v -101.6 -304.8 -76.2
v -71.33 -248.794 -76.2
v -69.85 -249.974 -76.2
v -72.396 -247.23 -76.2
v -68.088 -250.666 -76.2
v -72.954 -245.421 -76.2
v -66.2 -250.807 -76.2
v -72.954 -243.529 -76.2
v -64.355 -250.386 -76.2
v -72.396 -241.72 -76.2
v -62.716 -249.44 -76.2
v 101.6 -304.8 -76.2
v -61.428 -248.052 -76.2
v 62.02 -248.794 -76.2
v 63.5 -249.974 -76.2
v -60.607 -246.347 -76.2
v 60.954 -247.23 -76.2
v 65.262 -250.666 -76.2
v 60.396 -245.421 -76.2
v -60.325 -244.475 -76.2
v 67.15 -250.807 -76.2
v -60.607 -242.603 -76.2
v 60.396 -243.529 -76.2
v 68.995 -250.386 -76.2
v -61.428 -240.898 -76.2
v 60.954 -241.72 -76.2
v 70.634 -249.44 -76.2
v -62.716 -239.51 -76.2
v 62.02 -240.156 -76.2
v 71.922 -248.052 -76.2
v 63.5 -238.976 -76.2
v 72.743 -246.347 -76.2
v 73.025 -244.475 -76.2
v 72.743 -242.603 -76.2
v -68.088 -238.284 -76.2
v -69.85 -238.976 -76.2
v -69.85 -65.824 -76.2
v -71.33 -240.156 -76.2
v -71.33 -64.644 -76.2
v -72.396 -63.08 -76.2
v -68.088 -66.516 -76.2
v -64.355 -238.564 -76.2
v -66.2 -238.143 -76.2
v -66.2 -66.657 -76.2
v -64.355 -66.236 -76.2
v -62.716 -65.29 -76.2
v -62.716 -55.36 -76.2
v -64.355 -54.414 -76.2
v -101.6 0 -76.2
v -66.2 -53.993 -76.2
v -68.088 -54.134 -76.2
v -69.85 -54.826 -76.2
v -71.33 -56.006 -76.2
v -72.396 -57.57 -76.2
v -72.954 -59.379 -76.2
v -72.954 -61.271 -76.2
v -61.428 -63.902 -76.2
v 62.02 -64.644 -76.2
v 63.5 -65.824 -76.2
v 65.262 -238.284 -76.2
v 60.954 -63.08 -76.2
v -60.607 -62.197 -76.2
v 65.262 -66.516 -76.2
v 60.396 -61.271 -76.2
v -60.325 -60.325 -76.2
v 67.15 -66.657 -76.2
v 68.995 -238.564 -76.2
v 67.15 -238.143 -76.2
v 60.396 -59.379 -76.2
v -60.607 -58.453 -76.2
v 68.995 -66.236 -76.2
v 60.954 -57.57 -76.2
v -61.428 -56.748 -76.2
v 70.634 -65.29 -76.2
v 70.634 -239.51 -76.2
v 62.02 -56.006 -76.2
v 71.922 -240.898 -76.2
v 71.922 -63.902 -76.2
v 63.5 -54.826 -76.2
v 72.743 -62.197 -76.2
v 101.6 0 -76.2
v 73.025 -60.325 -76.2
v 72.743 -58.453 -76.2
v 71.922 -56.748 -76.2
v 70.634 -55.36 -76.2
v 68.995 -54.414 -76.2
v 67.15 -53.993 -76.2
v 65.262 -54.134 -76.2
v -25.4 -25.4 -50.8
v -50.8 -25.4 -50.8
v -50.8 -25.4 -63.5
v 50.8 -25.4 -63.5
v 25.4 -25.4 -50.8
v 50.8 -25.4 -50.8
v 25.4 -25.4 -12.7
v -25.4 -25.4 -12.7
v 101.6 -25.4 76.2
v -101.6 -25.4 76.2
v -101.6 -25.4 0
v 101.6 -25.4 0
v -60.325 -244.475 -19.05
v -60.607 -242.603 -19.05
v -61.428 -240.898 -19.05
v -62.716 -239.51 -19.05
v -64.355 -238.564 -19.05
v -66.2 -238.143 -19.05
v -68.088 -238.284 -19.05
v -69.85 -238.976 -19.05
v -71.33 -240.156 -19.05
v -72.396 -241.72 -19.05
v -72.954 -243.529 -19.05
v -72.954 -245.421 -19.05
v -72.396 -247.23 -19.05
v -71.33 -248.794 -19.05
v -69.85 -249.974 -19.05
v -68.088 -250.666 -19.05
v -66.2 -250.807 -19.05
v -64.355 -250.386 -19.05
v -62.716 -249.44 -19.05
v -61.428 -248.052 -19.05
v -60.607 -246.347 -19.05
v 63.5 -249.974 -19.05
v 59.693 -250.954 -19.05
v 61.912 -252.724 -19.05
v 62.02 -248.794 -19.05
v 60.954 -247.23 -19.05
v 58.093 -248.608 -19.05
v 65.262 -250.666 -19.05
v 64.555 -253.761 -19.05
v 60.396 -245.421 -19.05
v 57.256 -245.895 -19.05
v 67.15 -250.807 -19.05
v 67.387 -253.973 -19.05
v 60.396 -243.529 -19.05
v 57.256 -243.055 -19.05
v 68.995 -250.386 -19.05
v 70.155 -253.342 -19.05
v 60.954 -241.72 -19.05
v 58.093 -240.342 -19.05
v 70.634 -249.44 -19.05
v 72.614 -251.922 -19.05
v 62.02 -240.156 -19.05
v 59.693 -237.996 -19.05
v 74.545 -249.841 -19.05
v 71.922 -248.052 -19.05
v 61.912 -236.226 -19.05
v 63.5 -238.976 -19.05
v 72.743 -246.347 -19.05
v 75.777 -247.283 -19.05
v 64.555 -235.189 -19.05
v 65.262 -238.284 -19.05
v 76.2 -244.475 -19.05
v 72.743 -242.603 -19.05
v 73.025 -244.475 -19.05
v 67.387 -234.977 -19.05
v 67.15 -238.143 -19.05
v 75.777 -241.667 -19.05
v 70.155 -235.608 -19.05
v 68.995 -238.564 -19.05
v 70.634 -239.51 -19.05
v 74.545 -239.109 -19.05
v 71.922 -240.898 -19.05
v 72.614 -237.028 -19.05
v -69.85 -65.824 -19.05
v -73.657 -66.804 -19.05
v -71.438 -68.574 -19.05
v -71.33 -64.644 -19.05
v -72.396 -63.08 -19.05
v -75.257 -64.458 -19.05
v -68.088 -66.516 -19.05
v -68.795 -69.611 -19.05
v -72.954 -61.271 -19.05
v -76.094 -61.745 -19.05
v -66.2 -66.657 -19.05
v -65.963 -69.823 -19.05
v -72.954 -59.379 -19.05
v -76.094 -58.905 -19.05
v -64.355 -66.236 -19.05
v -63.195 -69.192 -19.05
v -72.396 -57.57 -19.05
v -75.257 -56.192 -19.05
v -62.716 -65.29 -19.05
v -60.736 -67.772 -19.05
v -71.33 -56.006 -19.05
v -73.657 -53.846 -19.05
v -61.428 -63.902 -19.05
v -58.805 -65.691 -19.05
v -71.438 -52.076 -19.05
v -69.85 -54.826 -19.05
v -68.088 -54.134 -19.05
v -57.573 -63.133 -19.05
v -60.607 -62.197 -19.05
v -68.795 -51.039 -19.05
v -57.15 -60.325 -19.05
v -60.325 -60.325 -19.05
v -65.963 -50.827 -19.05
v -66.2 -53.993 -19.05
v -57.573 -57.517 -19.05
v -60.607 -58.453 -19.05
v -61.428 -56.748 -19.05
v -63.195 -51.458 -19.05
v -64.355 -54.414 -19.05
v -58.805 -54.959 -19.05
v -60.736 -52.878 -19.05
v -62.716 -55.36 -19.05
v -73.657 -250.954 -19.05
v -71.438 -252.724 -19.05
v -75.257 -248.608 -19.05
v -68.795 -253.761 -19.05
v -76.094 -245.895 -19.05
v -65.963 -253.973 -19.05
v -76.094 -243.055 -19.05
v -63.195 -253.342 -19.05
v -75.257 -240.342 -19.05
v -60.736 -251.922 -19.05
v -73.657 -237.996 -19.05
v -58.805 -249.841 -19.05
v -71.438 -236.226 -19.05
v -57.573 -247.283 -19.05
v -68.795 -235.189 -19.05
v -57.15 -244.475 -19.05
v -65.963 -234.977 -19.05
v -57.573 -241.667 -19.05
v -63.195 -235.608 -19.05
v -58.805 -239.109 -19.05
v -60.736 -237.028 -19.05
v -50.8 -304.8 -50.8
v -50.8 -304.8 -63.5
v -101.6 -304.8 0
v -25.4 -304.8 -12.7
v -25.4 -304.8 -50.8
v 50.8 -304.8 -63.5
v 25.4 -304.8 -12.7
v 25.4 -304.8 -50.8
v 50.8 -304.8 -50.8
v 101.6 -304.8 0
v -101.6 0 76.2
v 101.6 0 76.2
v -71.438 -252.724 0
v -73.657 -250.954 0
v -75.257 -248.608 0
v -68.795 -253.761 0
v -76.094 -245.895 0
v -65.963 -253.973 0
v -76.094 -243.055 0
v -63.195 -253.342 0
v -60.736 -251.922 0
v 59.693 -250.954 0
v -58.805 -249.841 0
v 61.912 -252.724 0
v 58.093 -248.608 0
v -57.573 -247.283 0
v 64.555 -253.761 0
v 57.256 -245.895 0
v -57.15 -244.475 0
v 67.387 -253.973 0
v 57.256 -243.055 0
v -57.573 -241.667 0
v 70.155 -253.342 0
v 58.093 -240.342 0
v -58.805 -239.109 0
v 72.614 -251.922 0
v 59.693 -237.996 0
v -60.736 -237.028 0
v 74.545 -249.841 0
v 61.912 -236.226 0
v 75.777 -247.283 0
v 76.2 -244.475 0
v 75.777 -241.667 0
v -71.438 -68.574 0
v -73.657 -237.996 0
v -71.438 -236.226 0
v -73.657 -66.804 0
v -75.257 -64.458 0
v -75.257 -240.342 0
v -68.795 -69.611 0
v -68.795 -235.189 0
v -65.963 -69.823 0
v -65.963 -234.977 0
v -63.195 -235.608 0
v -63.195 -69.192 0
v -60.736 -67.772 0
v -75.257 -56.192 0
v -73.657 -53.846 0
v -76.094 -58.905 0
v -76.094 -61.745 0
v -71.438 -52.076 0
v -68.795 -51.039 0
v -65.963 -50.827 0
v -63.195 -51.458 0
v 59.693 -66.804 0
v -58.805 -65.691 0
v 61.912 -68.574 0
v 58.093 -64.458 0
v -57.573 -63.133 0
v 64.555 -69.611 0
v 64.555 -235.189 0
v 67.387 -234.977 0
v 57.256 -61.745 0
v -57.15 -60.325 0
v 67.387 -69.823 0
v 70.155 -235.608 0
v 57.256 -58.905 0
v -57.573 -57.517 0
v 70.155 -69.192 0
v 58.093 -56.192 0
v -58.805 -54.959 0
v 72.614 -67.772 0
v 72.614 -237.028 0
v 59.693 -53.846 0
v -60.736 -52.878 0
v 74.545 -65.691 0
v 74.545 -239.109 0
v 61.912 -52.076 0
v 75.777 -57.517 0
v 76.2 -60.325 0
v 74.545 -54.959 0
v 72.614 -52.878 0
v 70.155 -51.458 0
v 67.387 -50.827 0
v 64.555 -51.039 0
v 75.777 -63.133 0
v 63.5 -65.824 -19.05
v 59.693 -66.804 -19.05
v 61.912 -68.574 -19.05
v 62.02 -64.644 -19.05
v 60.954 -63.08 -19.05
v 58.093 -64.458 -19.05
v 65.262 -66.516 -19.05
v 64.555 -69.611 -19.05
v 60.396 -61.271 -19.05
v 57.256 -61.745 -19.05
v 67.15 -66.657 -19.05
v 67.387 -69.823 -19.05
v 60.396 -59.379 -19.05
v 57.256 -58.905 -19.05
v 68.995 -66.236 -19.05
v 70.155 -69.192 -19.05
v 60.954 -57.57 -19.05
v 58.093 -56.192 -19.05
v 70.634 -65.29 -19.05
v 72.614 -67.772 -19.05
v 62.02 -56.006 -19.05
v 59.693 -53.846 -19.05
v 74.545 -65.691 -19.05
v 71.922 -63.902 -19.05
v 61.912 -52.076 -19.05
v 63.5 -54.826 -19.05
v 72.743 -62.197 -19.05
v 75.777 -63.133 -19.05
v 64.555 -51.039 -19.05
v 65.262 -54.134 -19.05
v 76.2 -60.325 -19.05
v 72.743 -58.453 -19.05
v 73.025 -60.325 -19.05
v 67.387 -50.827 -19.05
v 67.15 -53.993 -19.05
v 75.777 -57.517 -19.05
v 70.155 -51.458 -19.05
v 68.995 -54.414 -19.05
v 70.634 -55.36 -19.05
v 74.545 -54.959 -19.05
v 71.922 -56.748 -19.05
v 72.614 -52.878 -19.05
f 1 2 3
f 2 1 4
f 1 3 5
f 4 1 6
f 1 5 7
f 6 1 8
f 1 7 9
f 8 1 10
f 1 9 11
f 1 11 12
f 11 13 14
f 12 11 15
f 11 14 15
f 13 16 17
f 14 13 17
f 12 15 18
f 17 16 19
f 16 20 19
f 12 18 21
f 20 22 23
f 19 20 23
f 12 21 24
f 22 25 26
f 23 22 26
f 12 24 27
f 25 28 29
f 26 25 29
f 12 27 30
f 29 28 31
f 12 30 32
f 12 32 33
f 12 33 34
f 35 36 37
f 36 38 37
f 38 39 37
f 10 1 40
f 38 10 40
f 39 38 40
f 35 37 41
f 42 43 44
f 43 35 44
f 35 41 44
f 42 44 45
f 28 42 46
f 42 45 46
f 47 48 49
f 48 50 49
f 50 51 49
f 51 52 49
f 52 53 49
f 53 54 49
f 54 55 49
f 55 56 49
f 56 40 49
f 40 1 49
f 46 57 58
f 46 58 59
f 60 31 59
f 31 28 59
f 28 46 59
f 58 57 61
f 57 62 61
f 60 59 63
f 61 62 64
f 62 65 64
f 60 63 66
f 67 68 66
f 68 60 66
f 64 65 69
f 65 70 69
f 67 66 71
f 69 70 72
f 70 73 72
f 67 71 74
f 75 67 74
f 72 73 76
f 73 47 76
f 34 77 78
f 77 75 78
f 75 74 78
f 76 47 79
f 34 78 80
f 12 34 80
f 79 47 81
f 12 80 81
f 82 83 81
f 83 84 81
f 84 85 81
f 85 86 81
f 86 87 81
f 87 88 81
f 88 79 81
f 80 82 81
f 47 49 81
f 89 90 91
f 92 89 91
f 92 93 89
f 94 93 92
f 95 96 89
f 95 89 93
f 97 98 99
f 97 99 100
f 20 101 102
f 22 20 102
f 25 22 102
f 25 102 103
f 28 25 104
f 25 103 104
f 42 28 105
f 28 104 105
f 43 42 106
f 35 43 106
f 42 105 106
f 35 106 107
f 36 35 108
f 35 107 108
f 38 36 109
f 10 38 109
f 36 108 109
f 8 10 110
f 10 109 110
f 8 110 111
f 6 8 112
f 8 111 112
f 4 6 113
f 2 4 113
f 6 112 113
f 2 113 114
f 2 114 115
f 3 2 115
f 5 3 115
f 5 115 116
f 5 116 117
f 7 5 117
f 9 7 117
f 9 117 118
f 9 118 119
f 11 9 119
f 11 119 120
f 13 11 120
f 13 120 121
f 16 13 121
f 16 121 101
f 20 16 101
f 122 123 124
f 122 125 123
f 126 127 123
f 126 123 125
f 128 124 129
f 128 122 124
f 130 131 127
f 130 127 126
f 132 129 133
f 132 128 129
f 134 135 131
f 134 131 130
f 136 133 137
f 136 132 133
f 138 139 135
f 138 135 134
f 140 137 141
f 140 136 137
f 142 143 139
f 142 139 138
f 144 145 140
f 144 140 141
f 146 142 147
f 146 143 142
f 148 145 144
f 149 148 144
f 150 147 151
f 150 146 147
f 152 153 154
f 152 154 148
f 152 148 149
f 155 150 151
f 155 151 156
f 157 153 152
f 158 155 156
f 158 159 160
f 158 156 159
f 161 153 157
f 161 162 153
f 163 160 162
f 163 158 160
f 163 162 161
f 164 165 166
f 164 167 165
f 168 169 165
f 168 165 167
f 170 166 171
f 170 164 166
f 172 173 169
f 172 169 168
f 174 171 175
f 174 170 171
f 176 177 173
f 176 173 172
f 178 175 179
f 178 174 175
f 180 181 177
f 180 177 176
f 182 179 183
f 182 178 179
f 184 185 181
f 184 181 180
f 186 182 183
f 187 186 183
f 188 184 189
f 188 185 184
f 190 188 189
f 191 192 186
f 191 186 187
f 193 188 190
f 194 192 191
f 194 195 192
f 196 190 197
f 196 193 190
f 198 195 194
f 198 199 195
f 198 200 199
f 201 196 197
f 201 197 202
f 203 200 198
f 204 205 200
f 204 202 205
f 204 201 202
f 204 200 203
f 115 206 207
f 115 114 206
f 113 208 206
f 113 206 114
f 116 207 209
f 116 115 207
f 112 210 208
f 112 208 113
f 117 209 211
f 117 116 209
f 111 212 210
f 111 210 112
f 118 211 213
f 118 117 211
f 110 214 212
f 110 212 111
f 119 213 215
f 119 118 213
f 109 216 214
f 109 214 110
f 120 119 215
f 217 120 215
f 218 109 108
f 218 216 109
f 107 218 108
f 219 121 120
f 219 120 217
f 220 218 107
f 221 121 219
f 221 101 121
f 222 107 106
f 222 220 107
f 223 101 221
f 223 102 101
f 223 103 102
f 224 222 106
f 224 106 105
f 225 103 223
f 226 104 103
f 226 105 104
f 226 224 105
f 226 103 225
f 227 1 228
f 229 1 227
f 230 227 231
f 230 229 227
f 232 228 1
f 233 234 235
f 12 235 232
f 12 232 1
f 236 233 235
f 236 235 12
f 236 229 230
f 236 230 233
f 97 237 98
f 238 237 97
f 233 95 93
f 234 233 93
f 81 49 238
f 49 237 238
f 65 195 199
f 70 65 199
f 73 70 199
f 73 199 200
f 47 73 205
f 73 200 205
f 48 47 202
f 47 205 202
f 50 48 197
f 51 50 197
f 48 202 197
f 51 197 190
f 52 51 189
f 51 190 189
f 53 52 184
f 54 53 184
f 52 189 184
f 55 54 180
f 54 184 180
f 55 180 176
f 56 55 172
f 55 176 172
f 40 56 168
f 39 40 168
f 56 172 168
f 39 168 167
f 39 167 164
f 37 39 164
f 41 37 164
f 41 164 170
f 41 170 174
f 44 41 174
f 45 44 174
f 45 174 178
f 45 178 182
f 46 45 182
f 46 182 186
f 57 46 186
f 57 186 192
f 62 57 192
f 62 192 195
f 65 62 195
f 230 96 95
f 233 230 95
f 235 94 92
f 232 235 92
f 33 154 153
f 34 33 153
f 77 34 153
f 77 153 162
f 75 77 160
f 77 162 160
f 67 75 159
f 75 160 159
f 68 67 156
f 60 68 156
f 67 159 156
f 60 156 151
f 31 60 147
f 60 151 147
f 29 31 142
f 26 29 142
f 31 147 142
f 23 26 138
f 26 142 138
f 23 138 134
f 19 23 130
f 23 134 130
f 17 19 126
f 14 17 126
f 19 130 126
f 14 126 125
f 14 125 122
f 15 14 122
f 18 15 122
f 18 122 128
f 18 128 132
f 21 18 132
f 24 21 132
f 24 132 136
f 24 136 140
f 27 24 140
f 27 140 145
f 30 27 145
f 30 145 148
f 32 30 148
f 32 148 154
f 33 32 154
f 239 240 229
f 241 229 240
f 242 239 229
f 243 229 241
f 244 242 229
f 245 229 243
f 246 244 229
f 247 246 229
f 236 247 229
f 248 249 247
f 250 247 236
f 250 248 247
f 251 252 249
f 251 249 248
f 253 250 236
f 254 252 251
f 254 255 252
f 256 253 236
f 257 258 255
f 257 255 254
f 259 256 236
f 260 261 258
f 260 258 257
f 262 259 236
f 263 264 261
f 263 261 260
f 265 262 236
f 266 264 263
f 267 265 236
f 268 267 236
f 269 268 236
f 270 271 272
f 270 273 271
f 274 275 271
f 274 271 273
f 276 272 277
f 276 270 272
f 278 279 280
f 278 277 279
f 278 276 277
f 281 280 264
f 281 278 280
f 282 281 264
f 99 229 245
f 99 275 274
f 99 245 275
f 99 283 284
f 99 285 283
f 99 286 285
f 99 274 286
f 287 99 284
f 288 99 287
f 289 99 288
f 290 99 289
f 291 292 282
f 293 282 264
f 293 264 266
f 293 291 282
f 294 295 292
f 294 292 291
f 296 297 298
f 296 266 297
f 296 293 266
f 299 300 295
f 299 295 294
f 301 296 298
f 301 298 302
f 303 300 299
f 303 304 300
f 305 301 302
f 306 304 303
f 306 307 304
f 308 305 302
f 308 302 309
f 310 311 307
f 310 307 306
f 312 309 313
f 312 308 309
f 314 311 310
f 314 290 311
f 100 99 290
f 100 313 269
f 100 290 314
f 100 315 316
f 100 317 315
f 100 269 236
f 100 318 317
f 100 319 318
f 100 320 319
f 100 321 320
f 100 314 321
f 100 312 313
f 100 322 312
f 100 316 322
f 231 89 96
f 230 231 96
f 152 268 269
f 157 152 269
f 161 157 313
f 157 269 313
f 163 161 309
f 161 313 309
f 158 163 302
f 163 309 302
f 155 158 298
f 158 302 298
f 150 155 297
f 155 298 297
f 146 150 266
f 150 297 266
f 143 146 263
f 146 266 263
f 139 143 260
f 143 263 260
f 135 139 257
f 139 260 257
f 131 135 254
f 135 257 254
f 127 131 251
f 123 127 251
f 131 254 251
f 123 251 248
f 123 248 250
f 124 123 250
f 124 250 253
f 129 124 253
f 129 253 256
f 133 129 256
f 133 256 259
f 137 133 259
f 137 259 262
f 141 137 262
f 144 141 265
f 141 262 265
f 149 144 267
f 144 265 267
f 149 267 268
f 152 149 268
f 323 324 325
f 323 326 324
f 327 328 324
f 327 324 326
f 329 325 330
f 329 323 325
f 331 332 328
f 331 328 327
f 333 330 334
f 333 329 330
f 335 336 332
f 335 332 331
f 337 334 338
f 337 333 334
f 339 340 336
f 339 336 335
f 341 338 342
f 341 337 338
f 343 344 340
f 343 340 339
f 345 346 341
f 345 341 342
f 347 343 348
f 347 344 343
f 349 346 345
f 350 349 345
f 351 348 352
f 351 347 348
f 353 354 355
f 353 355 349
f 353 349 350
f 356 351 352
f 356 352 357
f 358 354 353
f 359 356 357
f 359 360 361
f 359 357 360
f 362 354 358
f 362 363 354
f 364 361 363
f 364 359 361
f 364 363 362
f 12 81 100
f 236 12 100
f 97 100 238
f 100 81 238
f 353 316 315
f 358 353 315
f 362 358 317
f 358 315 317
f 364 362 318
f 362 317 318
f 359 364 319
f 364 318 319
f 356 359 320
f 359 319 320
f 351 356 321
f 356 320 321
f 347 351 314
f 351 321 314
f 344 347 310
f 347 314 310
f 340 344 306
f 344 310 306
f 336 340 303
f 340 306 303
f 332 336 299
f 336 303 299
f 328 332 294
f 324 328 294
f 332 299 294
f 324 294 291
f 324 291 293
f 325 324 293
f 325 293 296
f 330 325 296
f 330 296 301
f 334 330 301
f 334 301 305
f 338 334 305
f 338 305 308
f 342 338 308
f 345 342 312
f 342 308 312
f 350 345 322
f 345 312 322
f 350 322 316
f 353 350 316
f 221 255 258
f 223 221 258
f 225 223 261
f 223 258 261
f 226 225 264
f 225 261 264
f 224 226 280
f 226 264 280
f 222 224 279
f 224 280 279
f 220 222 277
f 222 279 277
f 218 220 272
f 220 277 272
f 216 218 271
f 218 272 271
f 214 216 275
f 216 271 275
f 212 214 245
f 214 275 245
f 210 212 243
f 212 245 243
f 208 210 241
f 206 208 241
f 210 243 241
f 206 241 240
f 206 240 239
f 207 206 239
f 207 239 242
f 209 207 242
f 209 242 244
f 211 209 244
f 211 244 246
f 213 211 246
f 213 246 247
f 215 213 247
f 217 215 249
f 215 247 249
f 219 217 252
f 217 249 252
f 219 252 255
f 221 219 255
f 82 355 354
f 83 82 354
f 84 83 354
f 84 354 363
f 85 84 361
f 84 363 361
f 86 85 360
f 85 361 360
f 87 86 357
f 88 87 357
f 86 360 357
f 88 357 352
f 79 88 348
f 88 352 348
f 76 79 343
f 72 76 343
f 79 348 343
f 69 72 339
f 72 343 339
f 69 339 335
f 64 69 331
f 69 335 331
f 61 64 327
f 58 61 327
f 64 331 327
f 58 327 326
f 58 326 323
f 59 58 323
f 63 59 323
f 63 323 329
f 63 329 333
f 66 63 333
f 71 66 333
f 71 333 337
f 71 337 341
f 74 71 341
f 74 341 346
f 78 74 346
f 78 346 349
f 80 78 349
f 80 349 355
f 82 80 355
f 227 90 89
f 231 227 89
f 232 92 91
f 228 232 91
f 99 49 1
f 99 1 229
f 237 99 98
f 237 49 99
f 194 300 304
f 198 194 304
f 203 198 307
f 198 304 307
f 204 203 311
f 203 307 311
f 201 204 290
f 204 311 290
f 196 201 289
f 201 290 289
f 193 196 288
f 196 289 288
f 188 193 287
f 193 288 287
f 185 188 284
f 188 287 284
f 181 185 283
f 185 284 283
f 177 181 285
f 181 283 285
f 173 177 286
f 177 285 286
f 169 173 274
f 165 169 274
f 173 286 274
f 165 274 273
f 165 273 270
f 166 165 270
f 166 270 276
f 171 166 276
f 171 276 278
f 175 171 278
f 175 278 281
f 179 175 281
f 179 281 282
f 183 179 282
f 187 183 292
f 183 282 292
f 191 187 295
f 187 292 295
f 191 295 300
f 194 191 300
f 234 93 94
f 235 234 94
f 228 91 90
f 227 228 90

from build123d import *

# Parameters (mm, degrees)
F0_W     = 203.2
F0_H     = 76.2
F1_DEPTH = 304.8
F2_W     = 203.2
F2_H     = 25.4
F3_DEPTH = 76.2
F4_R     = 9.525
F4_R_2   = 6.35
F5_DEPTH = 19.05
F6_DEPTH = 76.201


with BuildPart() as f1:
    # F0 (on Front) → F1 (new body)
    with BuildSketch(Plane.XZ):
        with Locations((0, -38.1)):
            Rectangle(F0_W, F0_H)
        Polygon((-50.8, -63.5), (-50.8, -50.8), (-25.4, -50.8), (-25.4, -12.7), (25.4, -12.7), (25.4, -50.8), (50.8, -50.8), (50.8, -63.5), align=None, mode=Mode.SUBTRACT)
    extrude(amount=F1_DEPTH)

    # F2 (on Top) → F3 (join, symmetric)
    with BuildSketch(Plane.XY):
        with Locations((0, -12.7)):
            Rectangle(F2_W, F2_H)
    extrude(amount=F3_DEPTH, both=True)

    # F4 (on Top) → F5 (cut)
    with BuildSketch(Plane.XY):
        with Locations((-66.675, -60.325)):
            Circle(F4_R)
        with Locations((-66.675, -60.325)):
            Circle(F4_R_2, mode=Mode.SUBTRACT)
        with Locations((66.675, -60.325)):
            Circle(F4_R)
        with Locations((66.675, -60.325)):
            Circle(F4_R_2, mode=Mode.SUBTRACT)
        with Locations((66.675, -244.475)):
            Circle(F4_R)
        with Locations((66.675, -244.475)):
            Circle(F4_R_2, mode=Mode.SUBTRACT)
        with Locations((-66.675, -244.475)):
            Circle(F4_R)
        with Locations((-66.675, -244.475)):
            Circle(F4_R_2, mode=Mode.SUBTRACT)
    extrude(amount=-F5_DEPTH, mode=Mode.SUBTRACT)

    # F6 (cut, through all): faces of the model
    f6_faces = [f1.faces().sort_by_distance(p)[0] for p in [
        (-66.675, -60.325, 0),
        (66.675, -60.325, 0),
        (-66.675, -244.475, 0),
        (66.675, -244.475, 0),
    ]]
    extrude(f6_faces, amount=-F6_DEPTH, mode=Mode.SUBTRACT)


solid = f1.part
